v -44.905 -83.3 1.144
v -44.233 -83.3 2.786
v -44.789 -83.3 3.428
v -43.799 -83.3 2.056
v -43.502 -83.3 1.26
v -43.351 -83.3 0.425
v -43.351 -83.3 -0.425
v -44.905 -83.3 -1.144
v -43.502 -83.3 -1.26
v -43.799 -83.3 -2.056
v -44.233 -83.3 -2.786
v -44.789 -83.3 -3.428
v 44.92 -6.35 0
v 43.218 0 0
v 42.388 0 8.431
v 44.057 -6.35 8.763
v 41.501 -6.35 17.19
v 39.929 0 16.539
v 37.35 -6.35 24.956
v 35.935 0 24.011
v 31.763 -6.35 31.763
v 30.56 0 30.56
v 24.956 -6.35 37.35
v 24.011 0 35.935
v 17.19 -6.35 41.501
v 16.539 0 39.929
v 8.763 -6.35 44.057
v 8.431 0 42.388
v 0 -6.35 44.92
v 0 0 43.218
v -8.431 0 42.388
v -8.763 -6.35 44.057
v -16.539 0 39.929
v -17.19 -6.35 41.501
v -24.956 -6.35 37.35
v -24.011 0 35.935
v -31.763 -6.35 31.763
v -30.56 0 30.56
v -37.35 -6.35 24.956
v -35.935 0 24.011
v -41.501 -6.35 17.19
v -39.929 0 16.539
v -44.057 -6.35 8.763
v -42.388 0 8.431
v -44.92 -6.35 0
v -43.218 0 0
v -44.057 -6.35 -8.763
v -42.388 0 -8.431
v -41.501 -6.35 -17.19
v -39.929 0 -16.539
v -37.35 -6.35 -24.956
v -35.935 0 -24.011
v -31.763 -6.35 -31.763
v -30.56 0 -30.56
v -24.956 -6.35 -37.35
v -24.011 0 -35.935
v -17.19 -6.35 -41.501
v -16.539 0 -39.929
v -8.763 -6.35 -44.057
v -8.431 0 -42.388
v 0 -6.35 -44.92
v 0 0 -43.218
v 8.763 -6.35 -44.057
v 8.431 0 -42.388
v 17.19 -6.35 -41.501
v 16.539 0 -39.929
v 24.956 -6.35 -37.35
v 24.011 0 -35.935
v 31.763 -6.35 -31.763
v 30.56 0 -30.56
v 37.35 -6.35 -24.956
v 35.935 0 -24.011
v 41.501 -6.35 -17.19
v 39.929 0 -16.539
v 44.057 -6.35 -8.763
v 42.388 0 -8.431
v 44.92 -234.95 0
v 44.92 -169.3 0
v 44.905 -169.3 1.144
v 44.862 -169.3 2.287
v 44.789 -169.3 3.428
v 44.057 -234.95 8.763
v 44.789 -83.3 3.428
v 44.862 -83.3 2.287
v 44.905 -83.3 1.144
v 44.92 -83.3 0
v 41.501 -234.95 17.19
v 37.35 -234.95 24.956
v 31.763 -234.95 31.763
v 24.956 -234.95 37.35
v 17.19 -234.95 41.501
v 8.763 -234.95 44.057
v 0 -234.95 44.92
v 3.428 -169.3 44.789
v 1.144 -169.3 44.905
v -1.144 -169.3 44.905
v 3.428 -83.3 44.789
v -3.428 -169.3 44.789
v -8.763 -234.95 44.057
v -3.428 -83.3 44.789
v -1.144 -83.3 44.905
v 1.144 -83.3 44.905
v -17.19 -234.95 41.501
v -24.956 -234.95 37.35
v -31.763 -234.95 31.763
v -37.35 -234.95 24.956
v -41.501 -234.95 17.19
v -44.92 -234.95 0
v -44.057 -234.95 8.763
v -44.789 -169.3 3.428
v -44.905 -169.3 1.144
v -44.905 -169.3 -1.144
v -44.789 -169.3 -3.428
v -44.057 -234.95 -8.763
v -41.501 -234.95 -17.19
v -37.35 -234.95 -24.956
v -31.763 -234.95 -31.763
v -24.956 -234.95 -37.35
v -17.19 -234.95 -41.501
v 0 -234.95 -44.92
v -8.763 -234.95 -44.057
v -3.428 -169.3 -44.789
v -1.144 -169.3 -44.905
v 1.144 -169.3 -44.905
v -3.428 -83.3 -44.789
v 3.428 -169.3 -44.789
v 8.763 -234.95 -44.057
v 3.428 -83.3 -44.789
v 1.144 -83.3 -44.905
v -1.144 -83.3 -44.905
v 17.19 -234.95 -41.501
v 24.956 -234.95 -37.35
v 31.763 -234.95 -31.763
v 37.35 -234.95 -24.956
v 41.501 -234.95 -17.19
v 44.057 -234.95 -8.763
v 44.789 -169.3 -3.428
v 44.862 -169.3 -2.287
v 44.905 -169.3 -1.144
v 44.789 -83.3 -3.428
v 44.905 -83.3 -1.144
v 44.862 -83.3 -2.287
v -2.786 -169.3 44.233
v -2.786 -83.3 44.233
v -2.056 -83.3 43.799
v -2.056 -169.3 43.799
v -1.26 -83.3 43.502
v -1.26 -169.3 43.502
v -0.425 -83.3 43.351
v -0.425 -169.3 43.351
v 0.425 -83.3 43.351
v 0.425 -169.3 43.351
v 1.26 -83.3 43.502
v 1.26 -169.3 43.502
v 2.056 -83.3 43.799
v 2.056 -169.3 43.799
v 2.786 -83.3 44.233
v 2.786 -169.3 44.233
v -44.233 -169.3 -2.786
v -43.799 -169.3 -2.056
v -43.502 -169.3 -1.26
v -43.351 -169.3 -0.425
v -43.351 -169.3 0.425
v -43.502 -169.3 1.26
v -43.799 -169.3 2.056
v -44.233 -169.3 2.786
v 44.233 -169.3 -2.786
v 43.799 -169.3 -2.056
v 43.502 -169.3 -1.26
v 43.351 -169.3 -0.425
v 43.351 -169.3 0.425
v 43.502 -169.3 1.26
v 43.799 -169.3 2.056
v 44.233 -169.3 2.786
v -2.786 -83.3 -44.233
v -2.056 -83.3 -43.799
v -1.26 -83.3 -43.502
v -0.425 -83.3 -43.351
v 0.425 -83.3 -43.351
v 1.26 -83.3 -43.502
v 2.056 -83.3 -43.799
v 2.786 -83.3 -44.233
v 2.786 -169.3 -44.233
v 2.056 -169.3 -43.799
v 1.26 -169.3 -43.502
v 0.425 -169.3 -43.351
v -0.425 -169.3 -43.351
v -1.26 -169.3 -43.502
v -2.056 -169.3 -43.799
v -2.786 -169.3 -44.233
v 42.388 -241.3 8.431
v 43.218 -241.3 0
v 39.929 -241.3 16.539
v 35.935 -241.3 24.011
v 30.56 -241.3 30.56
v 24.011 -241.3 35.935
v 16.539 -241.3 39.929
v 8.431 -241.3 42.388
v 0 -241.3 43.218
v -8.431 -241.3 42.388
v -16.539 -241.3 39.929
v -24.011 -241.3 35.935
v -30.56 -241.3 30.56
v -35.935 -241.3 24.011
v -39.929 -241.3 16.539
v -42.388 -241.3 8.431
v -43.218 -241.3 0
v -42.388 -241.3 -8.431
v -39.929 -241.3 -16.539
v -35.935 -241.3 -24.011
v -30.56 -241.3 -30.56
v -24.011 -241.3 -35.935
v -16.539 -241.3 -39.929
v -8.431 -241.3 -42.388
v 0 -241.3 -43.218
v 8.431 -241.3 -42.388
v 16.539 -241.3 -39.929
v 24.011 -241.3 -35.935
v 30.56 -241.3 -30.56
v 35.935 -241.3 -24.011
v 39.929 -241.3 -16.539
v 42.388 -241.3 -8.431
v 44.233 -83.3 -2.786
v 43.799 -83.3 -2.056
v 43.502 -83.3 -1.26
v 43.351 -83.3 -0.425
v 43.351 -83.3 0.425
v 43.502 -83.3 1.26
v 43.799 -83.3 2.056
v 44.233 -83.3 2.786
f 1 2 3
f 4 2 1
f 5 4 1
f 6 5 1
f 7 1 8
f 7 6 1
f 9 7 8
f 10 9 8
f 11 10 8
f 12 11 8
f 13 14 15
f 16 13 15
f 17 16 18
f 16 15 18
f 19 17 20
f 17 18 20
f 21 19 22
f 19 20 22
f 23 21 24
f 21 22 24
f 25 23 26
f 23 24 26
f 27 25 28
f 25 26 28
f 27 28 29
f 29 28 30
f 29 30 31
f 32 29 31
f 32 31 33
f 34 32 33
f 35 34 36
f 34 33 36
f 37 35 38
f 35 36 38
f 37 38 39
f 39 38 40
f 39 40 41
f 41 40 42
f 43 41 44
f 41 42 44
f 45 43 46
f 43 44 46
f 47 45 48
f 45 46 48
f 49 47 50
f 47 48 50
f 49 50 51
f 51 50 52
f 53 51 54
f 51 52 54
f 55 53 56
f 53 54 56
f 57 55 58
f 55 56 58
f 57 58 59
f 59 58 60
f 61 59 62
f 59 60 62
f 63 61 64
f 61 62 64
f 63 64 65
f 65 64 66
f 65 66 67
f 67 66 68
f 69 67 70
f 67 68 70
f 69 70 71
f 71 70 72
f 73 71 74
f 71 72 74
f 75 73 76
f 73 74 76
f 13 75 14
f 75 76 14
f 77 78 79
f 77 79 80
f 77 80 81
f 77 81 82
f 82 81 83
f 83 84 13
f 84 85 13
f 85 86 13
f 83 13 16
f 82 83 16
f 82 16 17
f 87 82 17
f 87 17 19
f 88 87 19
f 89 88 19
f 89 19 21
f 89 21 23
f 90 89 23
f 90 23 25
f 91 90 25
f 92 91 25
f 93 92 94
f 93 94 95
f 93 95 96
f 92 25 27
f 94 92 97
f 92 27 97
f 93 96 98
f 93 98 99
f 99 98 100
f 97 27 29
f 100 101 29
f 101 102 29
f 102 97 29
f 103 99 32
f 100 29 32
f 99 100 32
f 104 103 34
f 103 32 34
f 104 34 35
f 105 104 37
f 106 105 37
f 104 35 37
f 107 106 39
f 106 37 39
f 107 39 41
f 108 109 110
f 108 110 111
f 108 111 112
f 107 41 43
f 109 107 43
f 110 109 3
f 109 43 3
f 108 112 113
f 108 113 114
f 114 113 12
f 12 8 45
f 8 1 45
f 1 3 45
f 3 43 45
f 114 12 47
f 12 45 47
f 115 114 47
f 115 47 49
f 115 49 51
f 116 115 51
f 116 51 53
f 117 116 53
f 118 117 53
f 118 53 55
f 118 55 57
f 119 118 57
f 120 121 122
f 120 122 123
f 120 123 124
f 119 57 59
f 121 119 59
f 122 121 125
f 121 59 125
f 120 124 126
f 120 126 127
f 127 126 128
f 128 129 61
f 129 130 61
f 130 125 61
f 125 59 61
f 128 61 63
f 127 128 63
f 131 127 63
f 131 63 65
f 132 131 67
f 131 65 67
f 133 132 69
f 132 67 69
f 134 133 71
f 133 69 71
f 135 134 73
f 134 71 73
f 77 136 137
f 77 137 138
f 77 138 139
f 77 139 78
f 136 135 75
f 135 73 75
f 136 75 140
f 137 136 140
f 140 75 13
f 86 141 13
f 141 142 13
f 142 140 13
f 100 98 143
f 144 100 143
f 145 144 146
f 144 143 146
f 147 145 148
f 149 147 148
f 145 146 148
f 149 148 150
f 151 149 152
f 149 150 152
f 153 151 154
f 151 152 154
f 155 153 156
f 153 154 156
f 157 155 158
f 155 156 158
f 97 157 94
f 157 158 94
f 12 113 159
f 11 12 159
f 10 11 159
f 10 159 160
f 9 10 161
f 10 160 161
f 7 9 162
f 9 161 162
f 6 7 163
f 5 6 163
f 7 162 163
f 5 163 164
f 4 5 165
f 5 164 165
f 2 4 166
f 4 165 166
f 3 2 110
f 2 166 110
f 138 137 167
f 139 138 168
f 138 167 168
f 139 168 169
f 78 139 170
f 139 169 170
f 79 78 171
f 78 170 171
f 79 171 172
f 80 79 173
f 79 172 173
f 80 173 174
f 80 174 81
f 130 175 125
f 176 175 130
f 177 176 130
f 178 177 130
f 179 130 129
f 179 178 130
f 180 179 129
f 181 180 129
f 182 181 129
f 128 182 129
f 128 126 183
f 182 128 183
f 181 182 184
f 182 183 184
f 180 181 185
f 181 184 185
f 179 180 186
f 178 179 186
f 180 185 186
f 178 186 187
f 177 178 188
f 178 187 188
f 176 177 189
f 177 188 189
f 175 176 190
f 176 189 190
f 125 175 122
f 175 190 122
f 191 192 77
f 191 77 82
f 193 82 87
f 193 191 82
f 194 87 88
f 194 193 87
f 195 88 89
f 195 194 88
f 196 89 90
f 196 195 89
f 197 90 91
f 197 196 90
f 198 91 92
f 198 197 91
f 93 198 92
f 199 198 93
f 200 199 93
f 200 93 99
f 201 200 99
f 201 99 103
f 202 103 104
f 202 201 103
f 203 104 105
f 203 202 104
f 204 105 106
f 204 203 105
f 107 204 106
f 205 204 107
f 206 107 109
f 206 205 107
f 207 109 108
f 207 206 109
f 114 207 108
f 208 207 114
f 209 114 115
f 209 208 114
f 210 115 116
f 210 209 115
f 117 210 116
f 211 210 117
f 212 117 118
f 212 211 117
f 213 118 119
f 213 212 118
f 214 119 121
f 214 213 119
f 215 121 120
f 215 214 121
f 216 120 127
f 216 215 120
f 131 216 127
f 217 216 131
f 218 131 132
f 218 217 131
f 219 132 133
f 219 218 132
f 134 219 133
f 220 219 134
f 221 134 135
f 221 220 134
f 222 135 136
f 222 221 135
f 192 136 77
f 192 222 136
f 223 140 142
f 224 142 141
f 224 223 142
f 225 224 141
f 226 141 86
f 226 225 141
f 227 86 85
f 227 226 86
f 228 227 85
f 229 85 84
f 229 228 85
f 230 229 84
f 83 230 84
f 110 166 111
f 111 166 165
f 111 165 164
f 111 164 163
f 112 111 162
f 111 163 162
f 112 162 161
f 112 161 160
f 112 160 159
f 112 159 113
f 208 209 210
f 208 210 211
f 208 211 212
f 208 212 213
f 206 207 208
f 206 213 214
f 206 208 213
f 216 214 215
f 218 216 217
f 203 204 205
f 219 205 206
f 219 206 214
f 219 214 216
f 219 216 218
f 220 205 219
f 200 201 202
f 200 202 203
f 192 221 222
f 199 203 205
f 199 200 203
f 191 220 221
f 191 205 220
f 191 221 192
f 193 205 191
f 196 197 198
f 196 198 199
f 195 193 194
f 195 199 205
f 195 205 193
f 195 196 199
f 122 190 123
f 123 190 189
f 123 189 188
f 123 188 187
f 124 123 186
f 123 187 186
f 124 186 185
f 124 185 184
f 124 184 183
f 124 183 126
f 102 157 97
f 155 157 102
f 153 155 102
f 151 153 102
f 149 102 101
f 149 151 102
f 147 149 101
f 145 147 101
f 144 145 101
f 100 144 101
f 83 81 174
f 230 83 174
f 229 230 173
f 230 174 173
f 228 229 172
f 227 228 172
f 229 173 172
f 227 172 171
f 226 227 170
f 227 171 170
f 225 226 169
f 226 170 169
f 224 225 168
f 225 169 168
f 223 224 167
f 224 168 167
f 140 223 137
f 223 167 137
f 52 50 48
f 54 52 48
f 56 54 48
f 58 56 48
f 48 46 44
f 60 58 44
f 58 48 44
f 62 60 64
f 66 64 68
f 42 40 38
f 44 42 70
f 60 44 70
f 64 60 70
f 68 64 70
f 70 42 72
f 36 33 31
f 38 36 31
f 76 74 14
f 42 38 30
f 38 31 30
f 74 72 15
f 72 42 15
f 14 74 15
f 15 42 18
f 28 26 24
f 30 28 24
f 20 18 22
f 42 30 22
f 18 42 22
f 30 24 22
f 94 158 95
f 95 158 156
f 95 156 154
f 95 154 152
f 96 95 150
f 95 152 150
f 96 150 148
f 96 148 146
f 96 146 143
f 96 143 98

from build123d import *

# Parameters (mm, degrees)
F0_R            = 44.9199
F1_DEPTH        = 241.3
F2_SIZE2        = 1.7014773719
F2_SIZE         = 6.35
F4_R            = 4.7625
F5_DEPTH        = 86
F5_COPIES_COUNT = 4


# Not quite as in the source:
# - a pattern or mirror of a feature is missing from the dataset's text; its kind, count and spacing are read off the source's solid


with BuildPart() as f1:
    # F0 (on Front) → F1 (new body)
    with BuildSketch(Plane.XZ):
        Circle(F0_R)
    extrude(amount=F1_DEPTH)

    # F2
    f2_edges = [f1.edges().sort_by_distance(p)[0] for p in [
        (-44.9199, -241.3, 0),
        (-44.9199, 0, 0),
    ]]
    f2_side = f1.faces().sort_by_distance((-44.9199, -120.65, 0))[0]
    chamfer(f2_edges, length=F2_SIZE, length2=F2_SIZE2, reference=f2_side)

    # F4 (on offset) → F5 (cut)
    with BuildSketch(Plane.XZ.offset(169.3)):
        with Locations((0, -48.0949)):
            Circle(F4_R)
    f5 = extrude(amount=-F5_DEPTH, mode=Mode.SUBTRACT)

    # F5_copies: F5 ×4 about axis
    f5_copies_axis = Axis((0, 0, 0), (0, 1, 0))
    for i in range(1, F5_COPIES_COUNT):
        add(f5.rotate(f5_copies_axis, i * 360 / F5_COPIES_COUNT), mode=Mode.SUBTRACT)


solid = f1.part
